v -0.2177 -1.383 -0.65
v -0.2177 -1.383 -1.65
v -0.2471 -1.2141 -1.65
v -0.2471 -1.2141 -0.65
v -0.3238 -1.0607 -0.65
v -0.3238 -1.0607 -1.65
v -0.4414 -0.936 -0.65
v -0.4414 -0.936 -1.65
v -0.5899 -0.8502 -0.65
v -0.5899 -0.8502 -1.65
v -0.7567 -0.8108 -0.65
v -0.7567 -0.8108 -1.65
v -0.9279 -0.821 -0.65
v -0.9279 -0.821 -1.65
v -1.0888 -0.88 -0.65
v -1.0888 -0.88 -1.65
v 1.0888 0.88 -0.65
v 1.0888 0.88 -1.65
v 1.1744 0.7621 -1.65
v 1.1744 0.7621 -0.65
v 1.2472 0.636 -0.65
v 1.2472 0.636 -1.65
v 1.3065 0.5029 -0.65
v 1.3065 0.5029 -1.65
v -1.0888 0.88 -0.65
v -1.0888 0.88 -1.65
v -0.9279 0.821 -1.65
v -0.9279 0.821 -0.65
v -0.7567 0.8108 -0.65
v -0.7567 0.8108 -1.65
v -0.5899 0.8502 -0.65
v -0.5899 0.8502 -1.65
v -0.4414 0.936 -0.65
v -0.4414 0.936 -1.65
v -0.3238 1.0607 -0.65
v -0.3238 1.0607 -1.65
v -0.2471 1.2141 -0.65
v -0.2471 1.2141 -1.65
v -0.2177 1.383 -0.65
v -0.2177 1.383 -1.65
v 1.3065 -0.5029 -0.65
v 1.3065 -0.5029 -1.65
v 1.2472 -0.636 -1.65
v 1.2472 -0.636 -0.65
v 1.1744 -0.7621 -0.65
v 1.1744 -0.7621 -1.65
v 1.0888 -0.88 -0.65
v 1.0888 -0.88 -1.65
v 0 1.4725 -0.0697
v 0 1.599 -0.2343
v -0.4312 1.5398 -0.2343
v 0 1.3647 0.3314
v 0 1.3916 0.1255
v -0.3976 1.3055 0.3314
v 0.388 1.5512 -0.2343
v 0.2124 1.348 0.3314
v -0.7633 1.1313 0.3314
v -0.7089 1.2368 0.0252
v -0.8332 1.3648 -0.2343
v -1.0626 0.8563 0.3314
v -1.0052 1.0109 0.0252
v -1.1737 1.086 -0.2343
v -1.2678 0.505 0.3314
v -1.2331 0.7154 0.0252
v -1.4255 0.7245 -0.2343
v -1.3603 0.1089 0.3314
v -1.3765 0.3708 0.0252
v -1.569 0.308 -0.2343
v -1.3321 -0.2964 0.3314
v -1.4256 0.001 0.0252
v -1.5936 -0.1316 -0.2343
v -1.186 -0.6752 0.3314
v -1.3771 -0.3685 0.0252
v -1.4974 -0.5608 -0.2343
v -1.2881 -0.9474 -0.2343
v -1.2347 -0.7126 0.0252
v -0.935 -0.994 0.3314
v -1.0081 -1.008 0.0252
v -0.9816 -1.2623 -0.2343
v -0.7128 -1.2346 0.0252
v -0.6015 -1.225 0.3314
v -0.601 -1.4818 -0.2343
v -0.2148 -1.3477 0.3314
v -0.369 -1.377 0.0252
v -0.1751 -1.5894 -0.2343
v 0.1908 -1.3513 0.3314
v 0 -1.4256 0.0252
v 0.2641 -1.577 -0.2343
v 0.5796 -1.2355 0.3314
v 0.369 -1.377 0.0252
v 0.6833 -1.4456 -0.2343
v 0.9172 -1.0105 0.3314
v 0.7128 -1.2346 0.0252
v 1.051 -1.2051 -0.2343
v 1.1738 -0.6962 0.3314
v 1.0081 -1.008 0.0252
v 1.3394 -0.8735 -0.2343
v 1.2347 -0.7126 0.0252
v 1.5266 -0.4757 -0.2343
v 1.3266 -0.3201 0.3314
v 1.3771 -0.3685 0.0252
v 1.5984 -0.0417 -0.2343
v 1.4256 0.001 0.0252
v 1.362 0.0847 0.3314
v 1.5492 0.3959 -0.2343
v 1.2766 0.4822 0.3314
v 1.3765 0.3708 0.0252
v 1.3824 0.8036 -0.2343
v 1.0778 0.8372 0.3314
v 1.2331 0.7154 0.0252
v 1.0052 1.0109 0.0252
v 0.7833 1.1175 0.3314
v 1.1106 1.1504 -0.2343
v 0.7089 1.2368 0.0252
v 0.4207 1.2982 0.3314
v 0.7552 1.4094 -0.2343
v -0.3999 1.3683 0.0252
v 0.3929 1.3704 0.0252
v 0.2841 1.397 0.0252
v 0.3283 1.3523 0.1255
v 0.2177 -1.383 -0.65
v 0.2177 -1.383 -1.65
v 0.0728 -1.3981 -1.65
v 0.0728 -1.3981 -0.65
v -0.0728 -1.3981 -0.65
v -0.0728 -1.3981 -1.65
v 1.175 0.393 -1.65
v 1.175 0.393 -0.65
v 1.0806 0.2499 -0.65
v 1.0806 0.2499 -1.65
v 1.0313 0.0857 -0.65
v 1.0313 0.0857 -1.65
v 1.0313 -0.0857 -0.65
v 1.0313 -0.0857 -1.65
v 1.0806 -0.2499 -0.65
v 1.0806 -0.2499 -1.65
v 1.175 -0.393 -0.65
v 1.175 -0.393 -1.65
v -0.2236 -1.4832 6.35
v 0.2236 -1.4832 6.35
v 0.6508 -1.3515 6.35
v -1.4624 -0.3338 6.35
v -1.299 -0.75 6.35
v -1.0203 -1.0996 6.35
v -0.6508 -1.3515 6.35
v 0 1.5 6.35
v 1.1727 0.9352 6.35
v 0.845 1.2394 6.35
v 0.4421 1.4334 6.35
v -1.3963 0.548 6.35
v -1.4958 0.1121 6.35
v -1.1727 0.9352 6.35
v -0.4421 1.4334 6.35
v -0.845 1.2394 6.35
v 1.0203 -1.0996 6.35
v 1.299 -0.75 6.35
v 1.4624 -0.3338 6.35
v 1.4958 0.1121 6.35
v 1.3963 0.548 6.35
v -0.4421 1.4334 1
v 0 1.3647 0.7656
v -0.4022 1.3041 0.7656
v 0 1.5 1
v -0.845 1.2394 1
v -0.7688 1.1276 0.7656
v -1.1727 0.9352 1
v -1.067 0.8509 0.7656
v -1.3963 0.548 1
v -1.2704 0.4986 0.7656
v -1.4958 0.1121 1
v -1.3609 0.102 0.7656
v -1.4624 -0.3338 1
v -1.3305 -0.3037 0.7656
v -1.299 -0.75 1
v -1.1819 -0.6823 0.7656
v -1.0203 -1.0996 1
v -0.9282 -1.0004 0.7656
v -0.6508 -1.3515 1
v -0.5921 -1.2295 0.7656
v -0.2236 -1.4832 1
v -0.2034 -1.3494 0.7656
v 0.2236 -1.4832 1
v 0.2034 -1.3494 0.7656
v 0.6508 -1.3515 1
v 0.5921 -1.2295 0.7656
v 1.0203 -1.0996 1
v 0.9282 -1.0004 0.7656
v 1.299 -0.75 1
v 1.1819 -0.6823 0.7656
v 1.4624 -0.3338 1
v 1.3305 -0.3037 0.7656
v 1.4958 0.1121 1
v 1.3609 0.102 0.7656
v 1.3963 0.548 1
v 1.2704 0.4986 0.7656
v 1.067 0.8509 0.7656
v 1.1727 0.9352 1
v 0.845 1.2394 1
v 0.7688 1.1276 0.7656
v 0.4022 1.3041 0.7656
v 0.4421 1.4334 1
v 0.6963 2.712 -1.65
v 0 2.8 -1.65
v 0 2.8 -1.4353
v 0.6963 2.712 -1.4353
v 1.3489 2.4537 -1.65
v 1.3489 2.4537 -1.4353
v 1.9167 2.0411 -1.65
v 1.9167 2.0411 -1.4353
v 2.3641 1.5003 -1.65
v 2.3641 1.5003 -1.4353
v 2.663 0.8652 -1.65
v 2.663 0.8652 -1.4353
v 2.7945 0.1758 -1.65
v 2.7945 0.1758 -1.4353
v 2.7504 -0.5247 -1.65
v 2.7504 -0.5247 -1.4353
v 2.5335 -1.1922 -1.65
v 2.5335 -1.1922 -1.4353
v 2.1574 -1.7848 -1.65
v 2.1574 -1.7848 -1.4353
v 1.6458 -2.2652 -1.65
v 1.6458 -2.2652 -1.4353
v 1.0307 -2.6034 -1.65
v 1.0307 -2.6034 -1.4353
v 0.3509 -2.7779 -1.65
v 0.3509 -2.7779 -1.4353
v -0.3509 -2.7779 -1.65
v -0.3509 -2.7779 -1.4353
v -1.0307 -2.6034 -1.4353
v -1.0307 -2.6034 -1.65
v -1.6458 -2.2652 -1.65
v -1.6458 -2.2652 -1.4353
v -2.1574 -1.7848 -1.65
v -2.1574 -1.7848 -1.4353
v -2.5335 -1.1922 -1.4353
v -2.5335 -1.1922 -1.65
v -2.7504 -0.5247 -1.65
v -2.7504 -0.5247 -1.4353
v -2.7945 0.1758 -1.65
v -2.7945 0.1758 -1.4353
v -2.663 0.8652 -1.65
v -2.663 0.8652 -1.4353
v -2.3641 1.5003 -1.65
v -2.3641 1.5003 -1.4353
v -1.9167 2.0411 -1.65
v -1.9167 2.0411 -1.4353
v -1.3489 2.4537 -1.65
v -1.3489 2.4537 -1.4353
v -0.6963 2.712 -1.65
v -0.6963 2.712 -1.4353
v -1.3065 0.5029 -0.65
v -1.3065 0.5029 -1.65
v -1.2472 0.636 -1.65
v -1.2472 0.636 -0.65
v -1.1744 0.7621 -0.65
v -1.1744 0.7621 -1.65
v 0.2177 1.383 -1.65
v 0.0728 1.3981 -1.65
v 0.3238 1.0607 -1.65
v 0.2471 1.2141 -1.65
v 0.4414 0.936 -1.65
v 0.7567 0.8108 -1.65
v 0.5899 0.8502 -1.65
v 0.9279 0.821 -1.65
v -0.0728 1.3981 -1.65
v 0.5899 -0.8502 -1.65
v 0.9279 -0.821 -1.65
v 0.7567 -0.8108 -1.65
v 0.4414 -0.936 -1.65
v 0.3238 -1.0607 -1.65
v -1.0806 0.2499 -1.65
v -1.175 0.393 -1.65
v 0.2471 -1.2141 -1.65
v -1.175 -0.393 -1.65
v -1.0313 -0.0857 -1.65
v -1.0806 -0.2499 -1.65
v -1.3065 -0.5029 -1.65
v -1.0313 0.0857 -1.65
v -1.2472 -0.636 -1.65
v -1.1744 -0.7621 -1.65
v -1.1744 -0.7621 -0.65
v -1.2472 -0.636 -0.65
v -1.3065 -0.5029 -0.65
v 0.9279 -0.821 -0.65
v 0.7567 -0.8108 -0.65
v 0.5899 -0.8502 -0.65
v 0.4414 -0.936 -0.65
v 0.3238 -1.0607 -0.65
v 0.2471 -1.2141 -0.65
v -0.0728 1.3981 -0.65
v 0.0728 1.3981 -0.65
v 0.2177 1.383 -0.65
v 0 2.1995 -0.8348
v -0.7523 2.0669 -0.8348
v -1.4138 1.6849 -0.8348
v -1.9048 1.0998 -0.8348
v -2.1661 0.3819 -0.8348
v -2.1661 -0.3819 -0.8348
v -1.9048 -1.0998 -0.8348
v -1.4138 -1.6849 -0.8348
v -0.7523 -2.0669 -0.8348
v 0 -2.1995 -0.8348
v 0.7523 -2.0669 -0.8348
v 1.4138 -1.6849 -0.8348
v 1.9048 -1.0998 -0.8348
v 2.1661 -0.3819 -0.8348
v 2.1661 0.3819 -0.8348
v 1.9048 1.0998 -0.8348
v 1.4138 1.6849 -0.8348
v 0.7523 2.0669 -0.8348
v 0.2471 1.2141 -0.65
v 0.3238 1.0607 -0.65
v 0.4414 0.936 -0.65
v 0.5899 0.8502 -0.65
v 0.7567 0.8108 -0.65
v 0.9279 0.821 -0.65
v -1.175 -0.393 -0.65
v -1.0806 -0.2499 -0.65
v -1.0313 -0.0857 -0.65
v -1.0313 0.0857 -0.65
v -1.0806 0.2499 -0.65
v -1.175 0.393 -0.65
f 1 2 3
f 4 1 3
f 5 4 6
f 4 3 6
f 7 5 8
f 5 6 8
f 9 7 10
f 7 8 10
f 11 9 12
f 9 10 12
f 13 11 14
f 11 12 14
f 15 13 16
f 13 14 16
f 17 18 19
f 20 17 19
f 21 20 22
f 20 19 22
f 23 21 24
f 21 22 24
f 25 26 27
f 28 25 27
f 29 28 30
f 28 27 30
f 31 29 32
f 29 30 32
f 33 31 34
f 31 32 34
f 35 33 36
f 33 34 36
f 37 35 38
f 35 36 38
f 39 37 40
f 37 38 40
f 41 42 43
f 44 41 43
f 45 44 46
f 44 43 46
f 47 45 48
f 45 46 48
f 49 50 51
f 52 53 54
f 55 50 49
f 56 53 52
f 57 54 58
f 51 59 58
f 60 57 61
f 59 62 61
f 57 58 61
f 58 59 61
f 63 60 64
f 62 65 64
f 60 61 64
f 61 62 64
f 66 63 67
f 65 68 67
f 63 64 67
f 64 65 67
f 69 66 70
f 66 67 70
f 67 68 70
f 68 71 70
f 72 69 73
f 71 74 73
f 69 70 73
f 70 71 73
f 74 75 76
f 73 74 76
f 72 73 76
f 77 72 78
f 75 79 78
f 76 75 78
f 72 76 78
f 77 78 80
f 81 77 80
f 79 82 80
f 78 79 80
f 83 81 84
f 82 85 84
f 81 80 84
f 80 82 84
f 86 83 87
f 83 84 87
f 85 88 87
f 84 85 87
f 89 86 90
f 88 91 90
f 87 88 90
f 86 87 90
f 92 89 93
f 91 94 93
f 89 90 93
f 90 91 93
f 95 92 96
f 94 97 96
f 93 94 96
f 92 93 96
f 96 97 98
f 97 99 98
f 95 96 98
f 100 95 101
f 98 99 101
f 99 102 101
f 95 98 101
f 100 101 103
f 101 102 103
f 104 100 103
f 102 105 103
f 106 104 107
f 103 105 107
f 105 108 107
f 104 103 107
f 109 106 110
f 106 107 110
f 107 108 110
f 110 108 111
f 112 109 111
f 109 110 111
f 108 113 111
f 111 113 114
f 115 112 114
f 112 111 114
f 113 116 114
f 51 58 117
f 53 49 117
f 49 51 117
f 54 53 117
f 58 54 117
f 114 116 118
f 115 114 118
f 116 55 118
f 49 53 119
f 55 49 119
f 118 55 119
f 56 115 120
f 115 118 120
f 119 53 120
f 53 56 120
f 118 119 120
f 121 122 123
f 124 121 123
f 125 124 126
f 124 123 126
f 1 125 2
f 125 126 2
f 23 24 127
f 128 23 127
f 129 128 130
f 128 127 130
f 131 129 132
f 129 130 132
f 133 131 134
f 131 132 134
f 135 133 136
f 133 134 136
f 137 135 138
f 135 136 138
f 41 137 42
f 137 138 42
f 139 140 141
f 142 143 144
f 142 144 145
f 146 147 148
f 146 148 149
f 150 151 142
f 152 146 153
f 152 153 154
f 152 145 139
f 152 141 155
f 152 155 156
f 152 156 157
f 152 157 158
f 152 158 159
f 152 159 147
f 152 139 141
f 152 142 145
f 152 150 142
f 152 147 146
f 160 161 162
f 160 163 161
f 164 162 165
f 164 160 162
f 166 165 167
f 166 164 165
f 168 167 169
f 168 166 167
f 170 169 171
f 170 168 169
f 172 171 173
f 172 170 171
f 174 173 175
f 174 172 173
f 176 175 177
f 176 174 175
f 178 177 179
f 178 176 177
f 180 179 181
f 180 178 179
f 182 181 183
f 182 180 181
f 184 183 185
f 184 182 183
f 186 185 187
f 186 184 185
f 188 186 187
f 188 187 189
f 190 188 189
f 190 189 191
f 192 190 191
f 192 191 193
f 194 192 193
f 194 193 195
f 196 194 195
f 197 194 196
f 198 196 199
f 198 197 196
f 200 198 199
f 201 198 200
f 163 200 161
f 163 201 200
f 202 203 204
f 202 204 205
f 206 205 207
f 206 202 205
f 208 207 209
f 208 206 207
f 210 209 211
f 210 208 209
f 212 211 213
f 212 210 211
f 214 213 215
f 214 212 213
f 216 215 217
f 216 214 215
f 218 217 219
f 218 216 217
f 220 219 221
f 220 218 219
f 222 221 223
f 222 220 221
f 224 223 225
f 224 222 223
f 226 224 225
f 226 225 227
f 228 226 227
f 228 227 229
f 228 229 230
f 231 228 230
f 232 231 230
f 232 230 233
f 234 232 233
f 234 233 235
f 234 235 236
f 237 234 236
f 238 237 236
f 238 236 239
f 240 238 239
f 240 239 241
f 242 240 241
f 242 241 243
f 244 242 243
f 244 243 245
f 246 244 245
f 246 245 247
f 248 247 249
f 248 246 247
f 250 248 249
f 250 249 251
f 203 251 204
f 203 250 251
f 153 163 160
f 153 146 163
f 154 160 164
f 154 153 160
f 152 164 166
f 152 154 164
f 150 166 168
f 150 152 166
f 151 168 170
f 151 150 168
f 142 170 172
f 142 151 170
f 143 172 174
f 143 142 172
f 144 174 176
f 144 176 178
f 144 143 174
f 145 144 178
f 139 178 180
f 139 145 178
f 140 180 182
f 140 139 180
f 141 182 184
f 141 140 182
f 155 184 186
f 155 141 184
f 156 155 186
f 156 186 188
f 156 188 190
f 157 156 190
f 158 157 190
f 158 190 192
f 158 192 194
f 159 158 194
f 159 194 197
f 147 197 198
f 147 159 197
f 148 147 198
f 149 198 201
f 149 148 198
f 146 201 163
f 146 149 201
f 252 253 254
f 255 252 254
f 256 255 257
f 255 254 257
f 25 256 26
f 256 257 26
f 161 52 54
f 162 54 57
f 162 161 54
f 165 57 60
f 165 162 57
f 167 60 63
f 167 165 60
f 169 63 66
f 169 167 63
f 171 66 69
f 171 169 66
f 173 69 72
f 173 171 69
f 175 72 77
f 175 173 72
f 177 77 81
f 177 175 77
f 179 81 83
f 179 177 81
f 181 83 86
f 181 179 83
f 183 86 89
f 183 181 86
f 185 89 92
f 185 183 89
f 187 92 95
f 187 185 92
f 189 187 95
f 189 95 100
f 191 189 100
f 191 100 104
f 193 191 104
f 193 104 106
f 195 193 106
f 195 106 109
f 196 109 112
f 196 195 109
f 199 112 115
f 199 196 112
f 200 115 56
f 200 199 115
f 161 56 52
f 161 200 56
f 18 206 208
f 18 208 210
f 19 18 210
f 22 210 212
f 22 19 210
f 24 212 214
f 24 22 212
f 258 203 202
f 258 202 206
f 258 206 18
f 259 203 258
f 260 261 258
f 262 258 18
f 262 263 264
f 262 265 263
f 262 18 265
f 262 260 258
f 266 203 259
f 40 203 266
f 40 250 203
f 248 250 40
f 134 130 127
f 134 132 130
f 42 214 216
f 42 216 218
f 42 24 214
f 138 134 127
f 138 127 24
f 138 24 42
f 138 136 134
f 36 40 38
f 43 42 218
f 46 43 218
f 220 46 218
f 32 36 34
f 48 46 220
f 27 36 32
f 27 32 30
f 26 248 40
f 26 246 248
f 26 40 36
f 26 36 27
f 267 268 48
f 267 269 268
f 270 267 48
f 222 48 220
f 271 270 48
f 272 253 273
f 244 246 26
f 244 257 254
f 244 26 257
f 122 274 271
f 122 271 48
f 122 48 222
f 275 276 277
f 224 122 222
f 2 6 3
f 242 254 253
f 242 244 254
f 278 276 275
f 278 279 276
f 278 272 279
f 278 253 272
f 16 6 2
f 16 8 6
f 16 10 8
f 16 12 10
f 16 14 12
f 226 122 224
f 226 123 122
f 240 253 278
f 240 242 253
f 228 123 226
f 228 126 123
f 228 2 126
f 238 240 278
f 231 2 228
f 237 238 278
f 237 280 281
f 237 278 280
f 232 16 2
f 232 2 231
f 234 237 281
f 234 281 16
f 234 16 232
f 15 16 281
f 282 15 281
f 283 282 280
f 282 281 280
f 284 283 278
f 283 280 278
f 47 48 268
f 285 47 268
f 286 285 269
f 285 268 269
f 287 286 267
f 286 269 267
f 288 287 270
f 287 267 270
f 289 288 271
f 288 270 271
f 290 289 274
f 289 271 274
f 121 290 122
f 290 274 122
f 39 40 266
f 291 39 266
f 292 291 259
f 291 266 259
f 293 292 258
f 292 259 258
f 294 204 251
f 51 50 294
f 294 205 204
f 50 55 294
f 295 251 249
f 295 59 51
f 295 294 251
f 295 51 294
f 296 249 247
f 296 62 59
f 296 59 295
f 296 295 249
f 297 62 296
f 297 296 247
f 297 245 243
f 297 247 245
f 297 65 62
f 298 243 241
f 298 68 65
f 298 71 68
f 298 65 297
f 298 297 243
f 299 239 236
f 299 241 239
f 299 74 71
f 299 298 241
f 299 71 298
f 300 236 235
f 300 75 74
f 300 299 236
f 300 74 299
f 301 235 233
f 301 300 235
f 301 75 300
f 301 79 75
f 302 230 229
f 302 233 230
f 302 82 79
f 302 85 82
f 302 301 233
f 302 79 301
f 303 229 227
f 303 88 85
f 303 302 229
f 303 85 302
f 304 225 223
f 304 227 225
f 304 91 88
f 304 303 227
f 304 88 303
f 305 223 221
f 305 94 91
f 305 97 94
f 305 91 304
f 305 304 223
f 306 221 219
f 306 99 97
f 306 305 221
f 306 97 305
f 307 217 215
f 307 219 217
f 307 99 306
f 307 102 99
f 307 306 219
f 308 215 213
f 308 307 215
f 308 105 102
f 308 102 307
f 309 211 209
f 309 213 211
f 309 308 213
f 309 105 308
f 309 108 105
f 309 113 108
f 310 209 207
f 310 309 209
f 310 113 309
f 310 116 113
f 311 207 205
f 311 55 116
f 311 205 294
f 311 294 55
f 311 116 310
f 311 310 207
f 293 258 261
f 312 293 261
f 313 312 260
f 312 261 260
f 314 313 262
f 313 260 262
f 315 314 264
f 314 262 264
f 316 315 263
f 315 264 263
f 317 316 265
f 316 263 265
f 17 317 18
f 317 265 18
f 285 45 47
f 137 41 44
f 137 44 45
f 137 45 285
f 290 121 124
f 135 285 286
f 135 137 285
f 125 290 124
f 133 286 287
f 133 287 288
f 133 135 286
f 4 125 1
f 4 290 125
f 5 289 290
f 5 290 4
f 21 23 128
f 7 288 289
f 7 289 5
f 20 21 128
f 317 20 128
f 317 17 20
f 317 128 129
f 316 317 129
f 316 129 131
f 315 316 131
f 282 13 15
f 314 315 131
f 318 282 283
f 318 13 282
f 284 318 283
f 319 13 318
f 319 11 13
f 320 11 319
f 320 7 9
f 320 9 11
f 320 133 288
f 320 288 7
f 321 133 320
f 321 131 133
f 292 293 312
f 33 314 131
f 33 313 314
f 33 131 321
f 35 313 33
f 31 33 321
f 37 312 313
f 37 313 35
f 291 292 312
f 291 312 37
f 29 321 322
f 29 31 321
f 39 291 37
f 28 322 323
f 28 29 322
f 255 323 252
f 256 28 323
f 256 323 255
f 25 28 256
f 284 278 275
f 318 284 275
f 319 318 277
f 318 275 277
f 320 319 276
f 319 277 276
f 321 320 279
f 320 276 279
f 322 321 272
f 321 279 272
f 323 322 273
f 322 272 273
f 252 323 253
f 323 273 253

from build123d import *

# Parameters (mm, degrees)
SKETCH2_OUTSIDE_W       = 10.368
SKETCH2_OUTSIDE_H       = 10.368
SKETCH2_OUTSIDE_R       = 2.8
CUT_EXTRUDE1_DEPTH      = 10.06513549
FILLET1_R               = 0.8
ENL_V_MAT_EXTRU_1_DEPTH = 1


with BuildPart() as part:
    # Sketch1 → Base-Revolve (revolve)
    with BuildSketch(Plane(origin=(0, 0, 0), x_dir=(0, 0, -1), z_dir=(1, 0, 0))):
        Polygon((1.65, 0), (1.65, 3.0146875), (0, 1.3646875), (-0.765631875, 1.3646875), (-1, 1.5), (-6.35, 1.5), (-6.35, 0), align=None)
    revolve(axis=Axis((0, 0, -1.65), (0, 0, 1)))

    # Sketch2 outside → Cut-Extrude1 (cut, through all)
    with BuildSketch(Plane(origin=(0, 0, -1.65), x_dir=(-1, 0, 0), z_dir=(0, 0, -1))):
        Rectangle(SKETCH2_OUTSIDE_W, SKETCH2_OUTSIDE_H)
        with Locations(Location((0, 0, 0), (0, 0, 90))):
            Circle(SKETCH2_OUTSIDE_R, mode=Mode.SUBTRACT)
    extrude(amount=-CUT_EXTRUDE1_DEPTH, mode=Mode.SUBTRACT)

    # Fillet1
    fillet1_edges = [part.edges().sort_by_distance(p)[0] for p in [
        (0, -1.3646875, 0),
    ]]
    fillet(fillet1_edges, radius=FILLET1_R)

    # Esquisse1 → Enlèv. mat.-Extru.1 (cut)
    with BuildSketch(Plane(origin=(0, 0, -1.65), x_dir=(-1, 0, 0), z_dir=(0, 0, -1))):
        with BuildLine():
            ThreePointArc((1.088832331, -0.880025088), (1.212435565, -0.7), (1.306540248, -0.502943915))
            ThreePointArc((1.306540248, -0.502943915), (1.025, 0), (1.306540248, 0.502943915))
            ThreePointArc((1.306540248, 0.502943915), (1.212435565, 0.7), (1.088832331, 0.880025088))
            ThreePointArc((1.088832331, 0.880025088), (0.5125, 0.887676039), (0.217707917, 1.382969003))
            ThreePointArc((0.217707917, 1.382969003), (0, 1.4), (-0.217707917, 1.382969003))
            ThreePointArc((-0.217707917, 1.382969003), (-0.5125, 0.887676039), (-1.088832331, 0.880025088))
            ThreePointArc((-1.088832331, 0.880025088), (-1.212435565, 0.7), (-1.306540248, 0.502943915))
            ThreePointArc((-1.306540248, 0.502943915), (-1.025, 0), (-1.306540248, -0.502943915))
            ThreePointArc((-1.306540248, -0.502943915), (-1.212435565, -0.7), (-1.088832331, -0.880025088))
            ThreePointArc((-1.088832331, -0.880025088), (-0.5125, -0.887676039), (-0.217707917, -1.382969003))
            ThreePointArc((-0.217707917, -1.382969003), (0, -1.4), (0.217707917, -1.382969003))
            ThreePointArc((0.217707917, -1.382969003), (0.5125, -0.887676039), (1.088832331, -0.880025088))
        make_face()
    extrude(amount=-ENL_V_MAT_EXTRU_1_DEPTH, mode=Mode.SUBTRACT)


solid = part.part
